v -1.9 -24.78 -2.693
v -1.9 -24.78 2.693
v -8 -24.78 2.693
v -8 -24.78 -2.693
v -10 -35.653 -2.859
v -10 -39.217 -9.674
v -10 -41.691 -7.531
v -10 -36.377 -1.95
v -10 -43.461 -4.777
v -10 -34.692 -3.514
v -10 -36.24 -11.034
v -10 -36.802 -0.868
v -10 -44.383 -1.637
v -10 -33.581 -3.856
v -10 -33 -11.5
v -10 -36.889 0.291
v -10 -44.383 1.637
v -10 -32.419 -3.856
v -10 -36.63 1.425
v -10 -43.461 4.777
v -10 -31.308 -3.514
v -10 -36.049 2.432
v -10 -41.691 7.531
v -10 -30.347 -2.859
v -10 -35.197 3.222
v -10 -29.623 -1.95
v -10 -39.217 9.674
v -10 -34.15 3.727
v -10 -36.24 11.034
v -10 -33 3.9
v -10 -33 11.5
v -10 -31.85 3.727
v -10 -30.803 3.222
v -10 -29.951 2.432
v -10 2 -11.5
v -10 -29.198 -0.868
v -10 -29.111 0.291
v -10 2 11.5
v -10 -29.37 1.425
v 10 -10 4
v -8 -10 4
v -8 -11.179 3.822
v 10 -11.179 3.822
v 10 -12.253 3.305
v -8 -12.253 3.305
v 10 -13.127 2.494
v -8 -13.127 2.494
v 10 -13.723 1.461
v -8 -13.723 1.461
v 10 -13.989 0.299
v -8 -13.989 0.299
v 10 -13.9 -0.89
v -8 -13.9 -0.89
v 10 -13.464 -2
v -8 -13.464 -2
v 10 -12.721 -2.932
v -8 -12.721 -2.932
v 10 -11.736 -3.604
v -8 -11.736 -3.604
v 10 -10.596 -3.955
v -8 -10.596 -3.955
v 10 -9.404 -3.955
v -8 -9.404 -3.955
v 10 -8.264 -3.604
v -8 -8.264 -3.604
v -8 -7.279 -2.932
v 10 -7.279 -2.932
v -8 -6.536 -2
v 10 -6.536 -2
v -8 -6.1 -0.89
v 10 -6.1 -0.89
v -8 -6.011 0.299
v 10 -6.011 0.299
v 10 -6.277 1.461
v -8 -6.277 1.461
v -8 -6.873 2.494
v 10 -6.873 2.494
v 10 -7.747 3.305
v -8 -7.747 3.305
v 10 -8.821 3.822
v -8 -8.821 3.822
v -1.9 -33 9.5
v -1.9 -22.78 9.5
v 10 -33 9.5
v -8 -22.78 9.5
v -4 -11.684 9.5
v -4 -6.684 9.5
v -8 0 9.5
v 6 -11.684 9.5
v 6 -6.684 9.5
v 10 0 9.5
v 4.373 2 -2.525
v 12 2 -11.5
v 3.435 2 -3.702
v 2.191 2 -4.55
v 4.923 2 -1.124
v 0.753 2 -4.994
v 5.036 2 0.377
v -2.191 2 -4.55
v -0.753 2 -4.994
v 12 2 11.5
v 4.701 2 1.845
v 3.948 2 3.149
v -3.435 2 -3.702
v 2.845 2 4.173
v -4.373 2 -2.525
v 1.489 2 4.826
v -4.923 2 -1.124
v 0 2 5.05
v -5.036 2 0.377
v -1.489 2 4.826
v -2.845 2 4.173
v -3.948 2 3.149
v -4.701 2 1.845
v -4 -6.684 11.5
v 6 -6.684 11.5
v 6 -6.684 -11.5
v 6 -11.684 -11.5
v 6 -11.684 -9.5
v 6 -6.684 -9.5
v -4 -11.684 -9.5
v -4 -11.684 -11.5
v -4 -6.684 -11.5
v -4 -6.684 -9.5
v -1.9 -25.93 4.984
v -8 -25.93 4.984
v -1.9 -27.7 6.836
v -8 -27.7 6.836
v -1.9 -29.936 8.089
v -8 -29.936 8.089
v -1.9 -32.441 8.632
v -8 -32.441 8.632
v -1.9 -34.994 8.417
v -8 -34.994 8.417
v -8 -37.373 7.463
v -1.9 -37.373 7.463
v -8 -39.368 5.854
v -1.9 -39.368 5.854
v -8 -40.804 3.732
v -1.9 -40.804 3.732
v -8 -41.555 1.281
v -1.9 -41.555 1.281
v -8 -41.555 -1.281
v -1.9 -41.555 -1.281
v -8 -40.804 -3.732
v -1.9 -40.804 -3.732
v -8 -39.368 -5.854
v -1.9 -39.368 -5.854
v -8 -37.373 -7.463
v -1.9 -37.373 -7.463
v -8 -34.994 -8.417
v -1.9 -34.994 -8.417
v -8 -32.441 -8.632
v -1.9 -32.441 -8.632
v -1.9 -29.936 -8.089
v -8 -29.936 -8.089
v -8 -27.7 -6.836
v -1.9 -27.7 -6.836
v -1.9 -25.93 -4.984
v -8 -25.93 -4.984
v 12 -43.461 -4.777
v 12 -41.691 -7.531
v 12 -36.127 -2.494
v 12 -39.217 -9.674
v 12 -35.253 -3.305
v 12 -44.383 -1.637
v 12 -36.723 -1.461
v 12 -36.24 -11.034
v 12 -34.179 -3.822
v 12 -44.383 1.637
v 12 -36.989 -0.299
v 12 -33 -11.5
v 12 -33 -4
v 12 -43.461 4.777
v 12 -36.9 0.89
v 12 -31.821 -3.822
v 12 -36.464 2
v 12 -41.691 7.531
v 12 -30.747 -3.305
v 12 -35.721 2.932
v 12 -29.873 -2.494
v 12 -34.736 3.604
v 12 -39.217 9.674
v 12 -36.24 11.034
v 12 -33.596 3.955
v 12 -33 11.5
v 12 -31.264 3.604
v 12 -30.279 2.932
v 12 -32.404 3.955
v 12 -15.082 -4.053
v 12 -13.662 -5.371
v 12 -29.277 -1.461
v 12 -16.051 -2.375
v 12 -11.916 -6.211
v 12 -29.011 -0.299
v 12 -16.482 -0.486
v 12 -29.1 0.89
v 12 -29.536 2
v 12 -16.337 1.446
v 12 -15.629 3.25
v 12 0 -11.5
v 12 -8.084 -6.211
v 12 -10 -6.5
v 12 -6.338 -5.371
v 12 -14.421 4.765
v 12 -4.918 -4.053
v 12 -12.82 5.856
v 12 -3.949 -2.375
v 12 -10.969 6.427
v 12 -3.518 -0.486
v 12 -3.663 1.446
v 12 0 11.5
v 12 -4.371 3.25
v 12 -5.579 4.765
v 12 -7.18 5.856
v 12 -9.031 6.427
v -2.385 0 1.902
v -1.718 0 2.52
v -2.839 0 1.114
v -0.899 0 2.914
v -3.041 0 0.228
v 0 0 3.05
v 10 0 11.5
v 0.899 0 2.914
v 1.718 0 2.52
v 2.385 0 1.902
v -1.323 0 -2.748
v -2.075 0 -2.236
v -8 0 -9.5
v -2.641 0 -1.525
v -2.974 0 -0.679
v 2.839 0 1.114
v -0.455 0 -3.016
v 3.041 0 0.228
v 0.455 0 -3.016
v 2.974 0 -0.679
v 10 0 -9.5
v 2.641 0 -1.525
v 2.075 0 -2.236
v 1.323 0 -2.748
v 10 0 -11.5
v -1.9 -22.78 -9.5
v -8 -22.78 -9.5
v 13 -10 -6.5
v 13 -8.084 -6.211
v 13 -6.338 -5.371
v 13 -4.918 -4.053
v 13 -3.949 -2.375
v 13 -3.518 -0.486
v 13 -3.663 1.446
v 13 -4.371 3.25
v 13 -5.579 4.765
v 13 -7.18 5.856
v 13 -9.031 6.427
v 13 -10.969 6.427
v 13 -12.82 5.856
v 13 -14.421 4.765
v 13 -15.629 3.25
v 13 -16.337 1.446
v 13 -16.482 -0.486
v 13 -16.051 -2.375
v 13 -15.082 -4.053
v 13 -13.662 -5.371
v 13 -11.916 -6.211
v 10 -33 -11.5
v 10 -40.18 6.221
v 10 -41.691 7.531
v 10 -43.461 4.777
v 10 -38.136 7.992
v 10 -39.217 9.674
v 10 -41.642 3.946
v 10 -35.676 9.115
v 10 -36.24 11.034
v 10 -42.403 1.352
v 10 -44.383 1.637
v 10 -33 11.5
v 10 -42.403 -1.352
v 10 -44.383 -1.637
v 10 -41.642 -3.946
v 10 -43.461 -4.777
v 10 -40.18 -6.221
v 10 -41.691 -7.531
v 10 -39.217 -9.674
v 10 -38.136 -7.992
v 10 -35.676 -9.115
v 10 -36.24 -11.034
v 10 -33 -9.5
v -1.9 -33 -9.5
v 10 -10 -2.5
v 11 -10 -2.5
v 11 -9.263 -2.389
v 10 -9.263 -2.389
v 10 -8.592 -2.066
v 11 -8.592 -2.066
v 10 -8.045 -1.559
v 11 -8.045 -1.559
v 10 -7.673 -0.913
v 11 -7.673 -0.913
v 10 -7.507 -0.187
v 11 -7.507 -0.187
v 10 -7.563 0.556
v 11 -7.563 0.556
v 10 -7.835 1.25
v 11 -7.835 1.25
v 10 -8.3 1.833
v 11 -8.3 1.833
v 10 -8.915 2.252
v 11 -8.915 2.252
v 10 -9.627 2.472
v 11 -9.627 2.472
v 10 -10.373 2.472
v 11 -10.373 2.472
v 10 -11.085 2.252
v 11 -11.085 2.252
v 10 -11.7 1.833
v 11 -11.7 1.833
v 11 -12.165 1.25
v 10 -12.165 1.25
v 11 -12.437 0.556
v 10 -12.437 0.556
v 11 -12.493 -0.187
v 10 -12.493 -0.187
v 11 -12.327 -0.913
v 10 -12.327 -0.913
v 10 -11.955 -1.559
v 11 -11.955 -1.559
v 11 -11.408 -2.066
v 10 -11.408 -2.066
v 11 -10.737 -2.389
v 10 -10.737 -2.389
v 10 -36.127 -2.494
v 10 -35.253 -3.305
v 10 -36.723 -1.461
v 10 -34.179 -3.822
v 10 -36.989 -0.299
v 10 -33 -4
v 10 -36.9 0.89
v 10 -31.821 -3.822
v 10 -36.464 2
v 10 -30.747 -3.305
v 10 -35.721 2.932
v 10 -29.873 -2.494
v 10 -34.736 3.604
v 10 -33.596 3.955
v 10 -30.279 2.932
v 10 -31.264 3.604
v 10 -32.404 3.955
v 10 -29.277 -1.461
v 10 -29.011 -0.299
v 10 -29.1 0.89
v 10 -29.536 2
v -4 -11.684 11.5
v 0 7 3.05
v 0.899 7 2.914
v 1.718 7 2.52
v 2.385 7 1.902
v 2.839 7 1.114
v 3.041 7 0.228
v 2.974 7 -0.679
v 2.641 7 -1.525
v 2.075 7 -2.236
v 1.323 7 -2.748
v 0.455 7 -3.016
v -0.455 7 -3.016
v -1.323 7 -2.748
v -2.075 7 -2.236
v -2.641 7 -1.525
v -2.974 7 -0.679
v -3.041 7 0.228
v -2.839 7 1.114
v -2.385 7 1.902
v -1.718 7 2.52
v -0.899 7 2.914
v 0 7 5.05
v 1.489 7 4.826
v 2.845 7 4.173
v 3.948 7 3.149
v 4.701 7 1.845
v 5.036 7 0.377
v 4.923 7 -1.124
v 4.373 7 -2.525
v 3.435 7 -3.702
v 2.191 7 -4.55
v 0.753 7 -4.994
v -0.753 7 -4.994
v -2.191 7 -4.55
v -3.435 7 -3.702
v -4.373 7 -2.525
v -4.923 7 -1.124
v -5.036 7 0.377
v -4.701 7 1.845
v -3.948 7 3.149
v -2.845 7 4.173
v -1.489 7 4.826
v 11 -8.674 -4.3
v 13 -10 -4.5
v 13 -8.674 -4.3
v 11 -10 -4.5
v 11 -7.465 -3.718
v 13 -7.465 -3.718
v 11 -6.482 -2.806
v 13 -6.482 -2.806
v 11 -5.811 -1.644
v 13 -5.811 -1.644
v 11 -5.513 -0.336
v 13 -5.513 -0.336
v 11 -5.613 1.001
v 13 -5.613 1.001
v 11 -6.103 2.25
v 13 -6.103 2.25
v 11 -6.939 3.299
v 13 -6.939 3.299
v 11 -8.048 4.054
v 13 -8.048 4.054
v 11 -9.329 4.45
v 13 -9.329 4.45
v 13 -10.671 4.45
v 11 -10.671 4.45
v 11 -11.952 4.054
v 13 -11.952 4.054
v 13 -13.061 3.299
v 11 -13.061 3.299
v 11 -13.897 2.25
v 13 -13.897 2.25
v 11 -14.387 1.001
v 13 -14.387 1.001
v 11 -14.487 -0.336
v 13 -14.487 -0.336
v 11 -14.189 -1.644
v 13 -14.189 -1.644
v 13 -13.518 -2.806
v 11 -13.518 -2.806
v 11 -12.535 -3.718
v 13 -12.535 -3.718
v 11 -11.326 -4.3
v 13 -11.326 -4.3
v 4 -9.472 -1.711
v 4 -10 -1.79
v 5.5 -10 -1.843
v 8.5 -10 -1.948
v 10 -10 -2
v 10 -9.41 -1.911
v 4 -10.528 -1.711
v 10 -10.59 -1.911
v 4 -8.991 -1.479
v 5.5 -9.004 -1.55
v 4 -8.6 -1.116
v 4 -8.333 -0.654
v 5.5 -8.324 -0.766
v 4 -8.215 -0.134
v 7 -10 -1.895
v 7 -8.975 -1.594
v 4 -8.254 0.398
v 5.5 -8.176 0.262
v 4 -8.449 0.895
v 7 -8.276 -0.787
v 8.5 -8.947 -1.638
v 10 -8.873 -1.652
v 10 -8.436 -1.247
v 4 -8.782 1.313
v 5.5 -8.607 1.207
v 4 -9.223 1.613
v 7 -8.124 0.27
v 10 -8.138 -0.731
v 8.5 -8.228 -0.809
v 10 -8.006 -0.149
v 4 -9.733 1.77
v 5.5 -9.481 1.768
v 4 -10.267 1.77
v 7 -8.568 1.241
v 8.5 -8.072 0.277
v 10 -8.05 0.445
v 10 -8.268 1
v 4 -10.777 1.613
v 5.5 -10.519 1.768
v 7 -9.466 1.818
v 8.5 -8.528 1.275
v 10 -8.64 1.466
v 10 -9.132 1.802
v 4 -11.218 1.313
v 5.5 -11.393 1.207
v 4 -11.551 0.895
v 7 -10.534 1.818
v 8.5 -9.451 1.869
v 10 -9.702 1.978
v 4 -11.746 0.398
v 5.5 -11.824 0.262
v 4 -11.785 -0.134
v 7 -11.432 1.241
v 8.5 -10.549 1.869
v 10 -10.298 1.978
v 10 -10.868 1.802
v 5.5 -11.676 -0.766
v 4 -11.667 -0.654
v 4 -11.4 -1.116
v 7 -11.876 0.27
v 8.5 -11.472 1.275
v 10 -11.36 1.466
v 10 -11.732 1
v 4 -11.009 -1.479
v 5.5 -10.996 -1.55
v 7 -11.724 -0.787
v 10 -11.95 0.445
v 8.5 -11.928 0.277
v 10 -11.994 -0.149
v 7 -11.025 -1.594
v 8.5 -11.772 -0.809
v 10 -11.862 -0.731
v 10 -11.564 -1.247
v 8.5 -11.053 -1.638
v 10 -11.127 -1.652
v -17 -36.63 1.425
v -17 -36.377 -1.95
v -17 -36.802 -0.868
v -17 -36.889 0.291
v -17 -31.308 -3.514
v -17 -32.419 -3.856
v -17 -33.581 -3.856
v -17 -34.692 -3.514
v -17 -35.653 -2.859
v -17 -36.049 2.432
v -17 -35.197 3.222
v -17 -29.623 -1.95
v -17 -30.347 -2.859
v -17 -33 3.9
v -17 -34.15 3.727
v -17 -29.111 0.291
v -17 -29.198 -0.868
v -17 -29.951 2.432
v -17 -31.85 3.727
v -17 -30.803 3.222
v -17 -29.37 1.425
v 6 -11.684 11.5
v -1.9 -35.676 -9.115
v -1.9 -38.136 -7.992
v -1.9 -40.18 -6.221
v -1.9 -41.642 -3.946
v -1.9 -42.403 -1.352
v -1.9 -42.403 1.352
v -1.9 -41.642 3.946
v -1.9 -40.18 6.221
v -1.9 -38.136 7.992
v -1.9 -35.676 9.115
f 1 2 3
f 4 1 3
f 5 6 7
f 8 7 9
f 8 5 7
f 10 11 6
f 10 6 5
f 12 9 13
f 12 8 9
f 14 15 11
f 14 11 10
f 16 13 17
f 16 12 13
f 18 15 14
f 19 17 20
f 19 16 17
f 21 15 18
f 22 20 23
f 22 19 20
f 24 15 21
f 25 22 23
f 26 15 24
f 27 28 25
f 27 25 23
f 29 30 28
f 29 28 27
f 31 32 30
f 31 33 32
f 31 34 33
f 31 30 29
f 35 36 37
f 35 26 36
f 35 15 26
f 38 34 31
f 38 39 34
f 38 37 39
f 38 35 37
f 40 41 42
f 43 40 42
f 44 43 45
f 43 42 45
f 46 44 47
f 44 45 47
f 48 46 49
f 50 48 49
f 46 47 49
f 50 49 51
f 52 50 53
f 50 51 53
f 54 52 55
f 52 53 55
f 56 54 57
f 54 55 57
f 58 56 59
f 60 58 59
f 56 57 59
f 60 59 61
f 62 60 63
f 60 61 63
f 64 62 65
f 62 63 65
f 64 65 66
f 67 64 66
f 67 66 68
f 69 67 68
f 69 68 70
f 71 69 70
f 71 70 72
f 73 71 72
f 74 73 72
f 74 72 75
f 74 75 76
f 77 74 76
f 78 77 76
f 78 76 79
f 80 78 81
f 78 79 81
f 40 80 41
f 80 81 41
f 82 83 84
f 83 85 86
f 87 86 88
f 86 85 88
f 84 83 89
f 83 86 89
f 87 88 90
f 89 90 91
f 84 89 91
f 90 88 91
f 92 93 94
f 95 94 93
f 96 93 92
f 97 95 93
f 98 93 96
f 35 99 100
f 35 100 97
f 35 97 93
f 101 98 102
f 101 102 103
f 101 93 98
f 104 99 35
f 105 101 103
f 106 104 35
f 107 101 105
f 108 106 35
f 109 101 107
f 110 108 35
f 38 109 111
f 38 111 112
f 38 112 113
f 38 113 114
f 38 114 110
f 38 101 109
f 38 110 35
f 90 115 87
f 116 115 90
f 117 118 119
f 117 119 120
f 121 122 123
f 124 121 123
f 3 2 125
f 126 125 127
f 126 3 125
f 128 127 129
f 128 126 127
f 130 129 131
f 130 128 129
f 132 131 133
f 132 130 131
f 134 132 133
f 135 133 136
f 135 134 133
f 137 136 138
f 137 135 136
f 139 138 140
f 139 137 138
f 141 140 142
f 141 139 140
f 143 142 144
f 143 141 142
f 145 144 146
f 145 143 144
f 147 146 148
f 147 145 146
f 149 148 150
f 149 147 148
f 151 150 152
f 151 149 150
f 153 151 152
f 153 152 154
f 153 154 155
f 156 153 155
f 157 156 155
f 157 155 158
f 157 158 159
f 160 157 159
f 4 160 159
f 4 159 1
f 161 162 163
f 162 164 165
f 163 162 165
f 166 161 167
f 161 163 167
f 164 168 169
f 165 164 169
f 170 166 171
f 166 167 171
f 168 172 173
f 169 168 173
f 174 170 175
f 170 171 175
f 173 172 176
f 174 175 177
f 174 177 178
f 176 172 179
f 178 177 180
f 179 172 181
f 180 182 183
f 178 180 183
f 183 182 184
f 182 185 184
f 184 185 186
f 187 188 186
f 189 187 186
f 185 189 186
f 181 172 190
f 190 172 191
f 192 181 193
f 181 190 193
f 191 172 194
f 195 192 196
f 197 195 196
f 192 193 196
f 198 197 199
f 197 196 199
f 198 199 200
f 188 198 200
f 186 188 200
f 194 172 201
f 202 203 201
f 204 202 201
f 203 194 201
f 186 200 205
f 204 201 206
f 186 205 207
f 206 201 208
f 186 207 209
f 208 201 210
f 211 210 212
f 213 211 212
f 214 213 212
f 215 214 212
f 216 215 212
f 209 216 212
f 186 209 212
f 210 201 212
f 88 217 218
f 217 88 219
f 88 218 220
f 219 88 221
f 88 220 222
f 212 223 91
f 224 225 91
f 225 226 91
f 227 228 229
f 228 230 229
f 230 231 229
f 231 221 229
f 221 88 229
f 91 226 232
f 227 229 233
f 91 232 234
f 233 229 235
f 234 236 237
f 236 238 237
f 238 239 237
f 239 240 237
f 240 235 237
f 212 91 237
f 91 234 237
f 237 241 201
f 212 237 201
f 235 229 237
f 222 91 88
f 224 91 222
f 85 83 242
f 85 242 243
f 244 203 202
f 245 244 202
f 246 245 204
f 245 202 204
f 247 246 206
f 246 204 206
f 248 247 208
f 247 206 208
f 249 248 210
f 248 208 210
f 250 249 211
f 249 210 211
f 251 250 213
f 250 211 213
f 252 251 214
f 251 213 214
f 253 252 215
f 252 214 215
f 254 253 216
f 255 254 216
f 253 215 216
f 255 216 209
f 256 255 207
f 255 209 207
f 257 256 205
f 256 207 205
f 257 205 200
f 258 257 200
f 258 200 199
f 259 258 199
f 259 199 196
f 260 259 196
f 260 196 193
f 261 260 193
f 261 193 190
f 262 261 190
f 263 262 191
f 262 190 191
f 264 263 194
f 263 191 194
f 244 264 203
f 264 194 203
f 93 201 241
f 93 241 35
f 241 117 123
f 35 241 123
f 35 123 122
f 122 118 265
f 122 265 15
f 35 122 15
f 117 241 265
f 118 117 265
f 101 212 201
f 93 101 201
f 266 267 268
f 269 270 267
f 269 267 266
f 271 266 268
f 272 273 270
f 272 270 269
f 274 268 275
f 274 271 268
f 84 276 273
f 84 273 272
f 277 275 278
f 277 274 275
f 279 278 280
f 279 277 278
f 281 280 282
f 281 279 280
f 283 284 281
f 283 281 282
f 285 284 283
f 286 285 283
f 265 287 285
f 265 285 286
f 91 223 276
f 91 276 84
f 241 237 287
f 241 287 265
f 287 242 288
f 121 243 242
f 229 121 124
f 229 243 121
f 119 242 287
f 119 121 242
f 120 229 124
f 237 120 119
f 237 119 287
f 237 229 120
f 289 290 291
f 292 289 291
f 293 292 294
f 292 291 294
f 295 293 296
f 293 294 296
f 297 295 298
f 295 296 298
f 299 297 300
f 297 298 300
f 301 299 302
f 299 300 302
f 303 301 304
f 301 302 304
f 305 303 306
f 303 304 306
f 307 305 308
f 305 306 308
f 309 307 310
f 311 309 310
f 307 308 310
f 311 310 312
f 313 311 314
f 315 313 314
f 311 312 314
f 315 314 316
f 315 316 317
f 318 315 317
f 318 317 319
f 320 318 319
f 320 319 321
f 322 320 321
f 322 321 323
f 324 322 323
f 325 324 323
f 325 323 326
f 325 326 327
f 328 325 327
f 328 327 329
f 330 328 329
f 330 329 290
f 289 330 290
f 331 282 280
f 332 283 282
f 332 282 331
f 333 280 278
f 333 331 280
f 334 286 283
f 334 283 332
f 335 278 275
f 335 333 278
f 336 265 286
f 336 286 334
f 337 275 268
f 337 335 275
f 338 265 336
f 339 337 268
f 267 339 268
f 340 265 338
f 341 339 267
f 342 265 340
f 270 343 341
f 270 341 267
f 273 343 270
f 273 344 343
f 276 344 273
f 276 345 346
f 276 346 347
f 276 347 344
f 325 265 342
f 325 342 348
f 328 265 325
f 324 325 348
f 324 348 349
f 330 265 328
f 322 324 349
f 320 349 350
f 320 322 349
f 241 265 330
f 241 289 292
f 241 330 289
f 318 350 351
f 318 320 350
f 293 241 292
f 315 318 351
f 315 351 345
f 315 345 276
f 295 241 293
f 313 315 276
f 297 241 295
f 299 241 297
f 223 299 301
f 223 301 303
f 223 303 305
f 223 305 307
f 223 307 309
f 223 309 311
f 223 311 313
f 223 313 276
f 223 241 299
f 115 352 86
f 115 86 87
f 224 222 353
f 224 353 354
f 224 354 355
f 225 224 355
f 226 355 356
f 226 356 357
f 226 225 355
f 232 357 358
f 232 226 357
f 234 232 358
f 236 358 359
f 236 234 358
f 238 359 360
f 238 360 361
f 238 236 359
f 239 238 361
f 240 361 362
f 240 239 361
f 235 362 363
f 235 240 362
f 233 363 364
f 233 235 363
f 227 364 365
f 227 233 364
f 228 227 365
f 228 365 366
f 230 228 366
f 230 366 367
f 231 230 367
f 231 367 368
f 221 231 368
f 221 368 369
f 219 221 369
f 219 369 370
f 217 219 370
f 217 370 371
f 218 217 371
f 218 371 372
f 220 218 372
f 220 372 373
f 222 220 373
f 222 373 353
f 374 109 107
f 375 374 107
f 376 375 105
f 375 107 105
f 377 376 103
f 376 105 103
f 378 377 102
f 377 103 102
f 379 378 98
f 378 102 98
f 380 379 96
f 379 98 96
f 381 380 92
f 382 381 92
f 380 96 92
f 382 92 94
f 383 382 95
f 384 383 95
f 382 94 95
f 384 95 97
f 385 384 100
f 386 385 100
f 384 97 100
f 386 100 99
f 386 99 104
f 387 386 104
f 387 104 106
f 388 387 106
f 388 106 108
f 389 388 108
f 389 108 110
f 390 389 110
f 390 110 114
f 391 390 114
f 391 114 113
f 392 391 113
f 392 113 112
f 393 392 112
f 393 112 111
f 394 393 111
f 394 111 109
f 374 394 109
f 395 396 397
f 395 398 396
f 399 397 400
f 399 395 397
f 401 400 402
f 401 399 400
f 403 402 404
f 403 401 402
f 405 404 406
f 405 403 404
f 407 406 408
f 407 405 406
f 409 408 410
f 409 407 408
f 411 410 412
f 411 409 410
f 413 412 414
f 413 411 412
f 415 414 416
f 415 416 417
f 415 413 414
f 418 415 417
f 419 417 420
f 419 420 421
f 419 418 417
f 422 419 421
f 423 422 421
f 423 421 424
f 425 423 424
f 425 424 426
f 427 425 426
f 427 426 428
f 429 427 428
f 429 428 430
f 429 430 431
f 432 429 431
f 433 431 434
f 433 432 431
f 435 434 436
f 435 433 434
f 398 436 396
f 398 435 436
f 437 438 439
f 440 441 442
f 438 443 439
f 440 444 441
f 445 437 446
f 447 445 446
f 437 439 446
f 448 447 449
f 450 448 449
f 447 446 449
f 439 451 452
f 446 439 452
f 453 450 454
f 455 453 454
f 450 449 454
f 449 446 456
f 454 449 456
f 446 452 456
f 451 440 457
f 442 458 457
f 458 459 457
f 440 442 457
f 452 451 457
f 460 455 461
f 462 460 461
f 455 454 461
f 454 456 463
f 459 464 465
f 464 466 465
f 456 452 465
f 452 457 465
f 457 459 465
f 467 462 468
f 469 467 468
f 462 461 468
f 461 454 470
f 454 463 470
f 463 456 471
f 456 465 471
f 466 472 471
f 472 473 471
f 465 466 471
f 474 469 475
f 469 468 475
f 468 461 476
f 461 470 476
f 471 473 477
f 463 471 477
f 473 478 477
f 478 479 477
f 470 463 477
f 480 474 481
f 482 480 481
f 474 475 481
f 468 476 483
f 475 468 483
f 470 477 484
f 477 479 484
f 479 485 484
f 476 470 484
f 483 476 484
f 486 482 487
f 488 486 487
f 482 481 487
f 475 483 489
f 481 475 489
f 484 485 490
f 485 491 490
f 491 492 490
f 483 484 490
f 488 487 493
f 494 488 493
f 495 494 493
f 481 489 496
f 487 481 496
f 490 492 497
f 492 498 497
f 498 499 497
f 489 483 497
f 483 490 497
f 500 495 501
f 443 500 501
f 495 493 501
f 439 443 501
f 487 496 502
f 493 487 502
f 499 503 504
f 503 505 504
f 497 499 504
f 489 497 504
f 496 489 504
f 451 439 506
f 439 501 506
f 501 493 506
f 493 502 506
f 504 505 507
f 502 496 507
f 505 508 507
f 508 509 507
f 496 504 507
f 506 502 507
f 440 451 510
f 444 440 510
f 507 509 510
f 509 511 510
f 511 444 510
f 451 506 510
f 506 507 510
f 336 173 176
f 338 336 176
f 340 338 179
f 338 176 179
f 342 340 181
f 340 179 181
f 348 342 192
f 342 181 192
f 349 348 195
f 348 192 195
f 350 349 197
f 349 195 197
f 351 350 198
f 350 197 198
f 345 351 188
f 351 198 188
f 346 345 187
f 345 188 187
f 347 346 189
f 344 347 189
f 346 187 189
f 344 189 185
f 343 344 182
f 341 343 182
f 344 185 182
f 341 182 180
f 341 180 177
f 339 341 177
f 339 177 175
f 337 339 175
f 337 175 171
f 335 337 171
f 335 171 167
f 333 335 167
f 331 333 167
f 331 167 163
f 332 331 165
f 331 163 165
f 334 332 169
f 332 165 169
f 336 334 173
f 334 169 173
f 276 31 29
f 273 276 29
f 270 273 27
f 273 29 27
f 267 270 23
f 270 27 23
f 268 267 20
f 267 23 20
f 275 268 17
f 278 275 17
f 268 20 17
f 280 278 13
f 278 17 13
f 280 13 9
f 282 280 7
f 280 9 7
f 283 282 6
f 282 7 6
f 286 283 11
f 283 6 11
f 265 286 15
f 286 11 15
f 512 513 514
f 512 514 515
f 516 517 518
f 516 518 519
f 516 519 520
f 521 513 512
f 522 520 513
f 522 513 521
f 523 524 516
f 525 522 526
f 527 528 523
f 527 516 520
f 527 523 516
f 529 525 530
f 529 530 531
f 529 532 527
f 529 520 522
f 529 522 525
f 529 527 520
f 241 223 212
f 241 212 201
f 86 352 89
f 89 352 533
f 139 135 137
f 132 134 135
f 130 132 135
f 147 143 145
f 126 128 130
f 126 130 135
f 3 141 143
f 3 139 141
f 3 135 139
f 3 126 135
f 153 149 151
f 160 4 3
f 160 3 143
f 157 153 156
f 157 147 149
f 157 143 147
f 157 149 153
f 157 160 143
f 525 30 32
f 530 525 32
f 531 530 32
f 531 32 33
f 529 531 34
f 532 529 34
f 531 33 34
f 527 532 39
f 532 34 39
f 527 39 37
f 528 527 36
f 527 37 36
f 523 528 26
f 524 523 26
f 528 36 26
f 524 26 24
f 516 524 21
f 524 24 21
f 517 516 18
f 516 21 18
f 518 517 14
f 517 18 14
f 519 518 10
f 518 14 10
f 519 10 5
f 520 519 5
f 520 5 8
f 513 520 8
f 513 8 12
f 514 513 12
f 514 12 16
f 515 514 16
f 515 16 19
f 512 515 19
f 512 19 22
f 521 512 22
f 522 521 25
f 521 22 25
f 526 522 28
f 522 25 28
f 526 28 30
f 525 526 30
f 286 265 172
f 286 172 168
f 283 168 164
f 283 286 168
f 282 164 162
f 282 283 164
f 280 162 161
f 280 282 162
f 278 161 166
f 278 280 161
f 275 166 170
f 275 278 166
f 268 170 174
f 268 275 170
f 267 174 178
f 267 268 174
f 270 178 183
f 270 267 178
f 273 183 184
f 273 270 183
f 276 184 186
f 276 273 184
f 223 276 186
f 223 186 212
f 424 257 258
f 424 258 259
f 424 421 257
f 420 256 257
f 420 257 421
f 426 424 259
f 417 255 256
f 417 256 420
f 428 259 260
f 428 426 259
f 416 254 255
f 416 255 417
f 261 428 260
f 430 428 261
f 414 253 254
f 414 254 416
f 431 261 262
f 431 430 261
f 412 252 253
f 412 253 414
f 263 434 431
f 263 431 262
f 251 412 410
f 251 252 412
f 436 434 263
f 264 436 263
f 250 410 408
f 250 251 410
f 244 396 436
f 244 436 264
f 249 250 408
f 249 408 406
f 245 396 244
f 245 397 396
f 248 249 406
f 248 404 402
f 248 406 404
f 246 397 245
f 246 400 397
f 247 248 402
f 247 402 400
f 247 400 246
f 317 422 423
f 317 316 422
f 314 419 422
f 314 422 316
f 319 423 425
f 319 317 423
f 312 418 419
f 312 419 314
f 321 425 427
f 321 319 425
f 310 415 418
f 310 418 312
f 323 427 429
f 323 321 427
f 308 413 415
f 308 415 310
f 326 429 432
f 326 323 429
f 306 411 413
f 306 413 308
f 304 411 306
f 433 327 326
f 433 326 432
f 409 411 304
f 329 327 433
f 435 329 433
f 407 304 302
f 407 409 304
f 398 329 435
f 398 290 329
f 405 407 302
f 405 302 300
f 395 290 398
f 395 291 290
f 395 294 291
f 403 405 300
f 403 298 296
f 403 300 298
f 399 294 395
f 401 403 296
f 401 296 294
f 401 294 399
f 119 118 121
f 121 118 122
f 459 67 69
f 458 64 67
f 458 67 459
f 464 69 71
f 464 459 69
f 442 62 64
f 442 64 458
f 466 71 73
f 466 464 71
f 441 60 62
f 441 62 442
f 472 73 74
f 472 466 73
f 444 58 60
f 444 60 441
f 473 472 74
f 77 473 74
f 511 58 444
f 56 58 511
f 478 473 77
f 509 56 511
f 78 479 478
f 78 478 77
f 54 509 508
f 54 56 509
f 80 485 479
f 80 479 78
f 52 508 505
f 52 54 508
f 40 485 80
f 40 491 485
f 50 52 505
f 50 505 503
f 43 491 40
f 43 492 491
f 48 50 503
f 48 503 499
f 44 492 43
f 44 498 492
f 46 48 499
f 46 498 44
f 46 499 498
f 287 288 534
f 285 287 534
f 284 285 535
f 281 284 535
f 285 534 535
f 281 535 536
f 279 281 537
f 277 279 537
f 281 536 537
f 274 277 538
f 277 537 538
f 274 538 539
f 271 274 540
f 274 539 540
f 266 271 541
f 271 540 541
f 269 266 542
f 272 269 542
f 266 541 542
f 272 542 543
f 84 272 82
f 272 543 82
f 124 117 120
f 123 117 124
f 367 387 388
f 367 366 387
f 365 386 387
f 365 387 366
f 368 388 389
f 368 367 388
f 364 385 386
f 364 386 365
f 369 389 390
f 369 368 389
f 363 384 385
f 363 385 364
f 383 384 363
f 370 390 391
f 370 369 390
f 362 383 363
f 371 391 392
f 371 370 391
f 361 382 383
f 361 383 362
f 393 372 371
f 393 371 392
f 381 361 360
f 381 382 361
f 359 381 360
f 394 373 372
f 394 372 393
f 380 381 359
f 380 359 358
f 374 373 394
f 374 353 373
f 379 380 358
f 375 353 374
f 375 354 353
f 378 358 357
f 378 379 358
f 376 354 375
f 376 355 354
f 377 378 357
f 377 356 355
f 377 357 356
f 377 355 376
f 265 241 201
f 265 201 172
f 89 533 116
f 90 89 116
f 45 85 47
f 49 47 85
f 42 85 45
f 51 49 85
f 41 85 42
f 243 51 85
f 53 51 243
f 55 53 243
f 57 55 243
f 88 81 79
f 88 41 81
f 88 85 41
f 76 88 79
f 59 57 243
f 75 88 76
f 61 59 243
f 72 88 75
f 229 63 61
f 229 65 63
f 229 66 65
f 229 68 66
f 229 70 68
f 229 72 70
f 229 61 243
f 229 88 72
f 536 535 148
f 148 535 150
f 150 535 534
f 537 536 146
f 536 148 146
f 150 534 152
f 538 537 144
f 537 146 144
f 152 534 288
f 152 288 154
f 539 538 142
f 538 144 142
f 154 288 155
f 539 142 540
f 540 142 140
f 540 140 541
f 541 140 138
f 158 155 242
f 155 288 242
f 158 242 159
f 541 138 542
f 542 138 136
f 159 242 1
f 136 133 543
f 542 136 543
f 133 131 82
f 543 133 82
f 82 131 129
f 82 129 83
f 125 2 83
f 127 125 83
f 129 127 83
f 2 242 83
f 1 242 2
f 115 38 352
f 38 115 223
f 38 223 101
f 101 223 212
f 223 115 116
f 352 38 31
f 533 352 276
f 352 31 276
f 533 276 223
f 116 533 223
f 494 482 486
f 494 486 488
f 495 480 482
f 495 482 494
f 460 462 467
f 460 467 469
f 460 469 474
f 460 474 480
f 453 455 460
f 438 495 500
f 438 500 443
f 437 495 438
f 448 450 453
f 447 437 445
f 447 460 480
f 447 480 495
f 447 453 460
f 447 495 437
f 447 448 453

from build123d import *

# Parameters (mm, degrees)
SKETCH1_R            = 5.05
SKETCH1_R_2          = 3.05
BOSS_EXTRUDE1_DEPTH  = 7
SKETCH2_R            = 3.05
BOSS_EXTRUDE2_DEPTH  = 2
SKETCH3_W            = 20
SKETCH3_H            = 2
BOSS_EXTRUDE3_DEPTH  = 35
BOSS_EXTRUDE4_DEPTH  = 20
SKETCH5_W            = 8.1
SKETCH5_H            = 2
BOSS_EXTRUDE5_DEPTH  = 19
BOSS_EXTRUDE6_DEPTH  = 8.1
BOSS_EXTRUDE7_DEPTH  = 2
SKETCH8_R            = 3.9
BOSS_EXTRUDE8_DEPTH  = 7
SKETCH9_R            = 4
BOSS_EXTRUDE9_DEPTH  = 18
SKETCH10_R           = 2
CUT_EXTRUDE1_DEPTH   = 6
CUT_EXTRUDE1_DRAFT   = -2
BOSS_EXTRUDE10_DEPTH = 2
CUT_EXTRUDE2_DEPTH   = 2
BOSS_EXTRUDE11_START = -2
SKETCH13_W           = 22
SKETCH13_H           = 23
SKETCH13_R           = 5.05
BOSS_EXTRUDE11_DEPTH = 2
SKETCH14_R           = 2.5
CUT_EXTRUDE3_DEPTH   = 2
SKETCH15_R           = 4.5
SKETCH15_R_2         = 2.5
CUT_EXTRUDE4_DEPTH   = 1
SKETCH16_R           = 6.5
SKETCH16_R_2         = 4.5
BOSS_EXTRUDE12_DEPTH = 1
SKETCH18_R           = 4
CUT_EXTRUDE6_DEPTH   = 2
SKETCH19_W           = 10
SKETCH19_H           = 5
CUT_EXTRUDE7_DEPTH   = 2
SKETCH20_W           = 10
SKETCH20_H           = 5
CUT_EXTRUDE8_DEPTH   = 2
SKETCH21_R           = 2
BOSS_EXTRUDE13_DEPTH = 2


with BuildPart() as part:
    # Sketch1 → Boss-Extrude1 (new body)
    with BuildSketch(Plane(origin=(0, 0, 0), x_dir=(1, 0, 0), z_dir=(0, 1, 0))):
        with Locations(Location((0, 0, 0), (0, 0, 270))):
            Circle(SKETCH1_R)
        with Locations(Location((0, 0, 0), (0, 0, 270))):
            Circle(SKETCH1_R_2, mode=Mode.SUBTRACT)
    extrude(amount=BOSS_EXTRUDE1_DEPTH)

    # Sketch2 → Boss-Extrude2 (add)
    with BuildSketch(Plane.XZ):
        with BuildLine():
            Line((-10, 11.5), (10, 11.5))
            ThreePointArc((10, 11.5), (21.5, 0), (10, -11.5))
            Line((10, -11.5), (-10, -11.5))
            ThreePointArc((-10, -11.5), (-21.5, 0), (-10, 11.5))
        make_face()
        with Locations(Location((0, 0, 0), (0, 0, 90))):
            Circle(SKETCH2_R, mode=Mode.SUBTRACT)
    extrude(amount=-BOSS_EXTRUDE2_DEPTH)

    # Sketch3 → Boss-Extrude3 (add)
    with BuildSketch(Plane(origin=(0, 2, 0), x_dir=(1, 0, 0), z_dir=(0, 1, 0))):
        with Locations((0, 10.5)):
            Rectangle(SKETCH3_W, SKETCH3_H)
        with Locations((0, -10.5)):
            Rectangle(SKETCH3_W, SKETCH3_H)
    extrude(amount=-BOSS_EXTRUDE3_DEPTH)

    # Sketch4 → Boss-Extrude4 (add)
    with BuildSketch(Plane.ZY.offset(10)):
        with BuildLine():
            Line((-11.5, -33), (-9.5, -33))
            ThreePointArc((-9.5, -33), (0, -42.5), (9.5, -33))
            Line((9.5, -33), (11.5, -33))
            ThreePointArc((11.5, -33), (0, -44.5), (-11.5, -33))
        make_face()
    extrude(amount=-BOSS_EXTRUDE4_DEPTH)

    # Sketch5 → Boss-Extrude5 (add)
    with BuildSketch(Plane(origin=(0, 0, 9.5), x_dir=(-1, 0, 0), z_dir=(0, 0, -1))):
        with Locations((5.95, -23.78)):
            Rectangle(SKETCH5_W, SKETCH5_H)
    extrude(amount=BOSS_EXTRUDE5_DEPTH)

    # Sketch6 → Boss-Extrude6 (add)
    with BuildSketch(Plane.ZY.offset(10)):
        with BuildLine():
            Line((9.5, -24.78), (2.693343647, -24.78))
            ThreePointArc((2.693343647, -24.78), (0, -41.65), (-2.693343647, -24.78))
            Line((-2.693343647, -24.78), (-9.5, -24.78))
            Line((-9.5, -24.78), (-9.5, -33))
            ThreePointArc((-9.5, -33), (0, -42.5), (9.5, -33))
            Line((9.5, -33), (9.5, -24.78))
        make_face()
    extrude(amount=-BOSS_EXTRUDE6_DEPTH)

    # Sketch7 → Boss-Extrude7 (add)
    with BuildSketch(Plane.ZY.offset(10)):
        with BuildLine():
            Line((-11.5, 2), (11.5, 2))
            Line((11.5, 2), (11.5, -33))
            ThreePointArc((11.5, -33), (0, -44.5), (-11.5, -33))
            Line((-11.5, -33), (-11.5, 2))
        make_face()
    extrude(amount=-BOSS_EXTRUDE7_DEPTH)

    # Sketch8 → Boss-Extrude8 (add)
    with BuildSketch(Plane.ZY.offset(10)):
        with Locations((0, -33)):
            Circle(SKETCH8_R)
    extrude(amount=BOSS_EXTRUDE8_DEPTH)

    # Sketch9 → Boss-Extrude9 (add)
    with BuildSketch(Plane(origin=(-8, 0, 0), x_dir=(0, 0, -1), z_dir=(1, 0, 0))):
        with Locations(Location((0, -10, 0), (0, 0, 180))):
            Circle(SKETCH9_R)
    extrude(amount=BOSS_EXTRUDE9_DEPTH)


with BuildPart() as cut_extrude1_tool:
    # Sketch10 → Cut-Extrude1 (with draft: the straight prism first)
    with BuildSketch(Plane(origin=(10, 0, 0), x_dir=(0, 0, -1), z_dir=(1, 0, 0))):
        with Locations((0, -10)):
            Circle(SKETCH10_R)
    extrude(amount=-CUT_EXTRUDE1_DEPTH)
    # Cut-Extrude1: the draft: its side faces are tilted about the plane it starts from
    cut_extrude1_sides = [cut_extrude1_tool.faces().sort_by_distance(p)[0] for p in [
        (7, -10, 2),
    ]]
    draft(cut_extrude1_sides, Plane(origin=(10, 0, 0), x_dir=(0, 0, -1), z_dir=(1, 0, 0)), CUT_EXTRUDE1_DRAFT)


with BuildPart() as part_1:
    add(part.part)

    # Cut-Extrude1: cut by cut_extrude1_tool
    add(cut_extrude1_tool.part, mode=Mode.SUBTRACT)

    # Sketch12 → Cut-Extrude2 (cut)
    with BuildSketch(Plane.XZ):
        with BuildLine():
            Line((-10, 11.5), (-10, -11.5))
            ThreePointArc((-10, -11.5), (-21.5, 0), (-10, 11.5))
        make_face()
        with BuildLine():
            Line((12, 11.324751653), (12, -11.324751653))
            ThreePointArc((12, -11.324751653), (21.5, 0), (12, 11.324751653))
        make_face()
    extrude(amount=-CUT_EXTRUDE2_DEPTH, mode=Mode.SUBTRACT)

    # Sketch13 → Boss-Extrude11 (add)
    with BuildSketch(Plane(origin=(0, 2, 0), x_dir=(1, 0, 0), z_dir=(0, 1, 0)).offset(BOSS_EXTRUDE11_START)):
        with Locations((1, 0)):
            Rectangle(SKETCH13_W, SKETCH13_H)
        with Locations(Location((0, 0, 0), (0, 0, 90))):
            Circle(SKETCH13_R, mode=Mode.SUBTRACT)
    extrude(amount=BOSS_EXTRUDE11_DEPTH)

    # Sketch19 → Cut-Extrude7 (cut)
    with BuildSketch(Plane(origin=(0, 0, -11.5), x_dir=(-1, 0, 0), z_dir=(0, 0, -1))):
        with Locations((-1, -9.184069539)):
            Rectangle(SKETCH19_W, SKETCH19_H)
    extrude(amount=-CUT_EXTRUDE7_DEPTH, mode=Mode.SUBTRACT)

    # Sketch20 → Cut-Extrude8 (cut)
    with BuildSketch(Plane.XY.offset(11.5)):
        with Locations((1, -9.184069539)):
            Rectangle(SKETCH20_W, SKETCH20_H)
    extrude(amount=-CUT_EXTRUDE8_DEPTH, mode=Mode.SUBTRACT)


with BuildPart() as body_2:
    # Sketch11 → Boss-Extrude10 (new body)
    with BuildSketch(Plane(origin=(10, 0, 0), x_dir=(0, 0, -1), z_dir=(1, 0, 0))):
        with BuildLine():
            Line((-11.5, 0), (11.5, 0))
            Line((11.5, 0), (11.5, -33))
            ThreePointArc((11.5, -33), (0, -44.5), (-11.5, -33))
            Line((-11.5, -33), (-11.5, 0))
        make_face()
    extrude(amount=BOSS_EXTRUDE10_DEPTH)

    # Sketch14 → Cut-Extrude3 (cut)
    with BuildSketch(Plane(origin=(12, 0, 0), x_dir=(0, 0, -1), z_dir=(1, 0, 0))):
        with Locations((0, -10)):
            Circle(SKETCH14_R)
    extrude(amount=-CUT_EXTRUDE3_DEPTH, mode=Mode.SUBTRACT)

    # Sketch15 → Cut-Extrude4 (cut)
    with BuildSketch(Plane(origin=(12, 0, 0), x_dir=(0, 0, -1), z_dir=(1, 0, 0))):
        with Locations((0, -10)):
            Circle(SKETCH15_R)
        with Locations((0, -10)):
            Circle(SKETCH15_R_2, mode=Mode.SUBTRACT)
    extrude(amount=-CUT_EXTRUDE4_DEPTH, mode=Mode.SUBTRACT)

    # Sketch16 → Boss-Extrude12 (add)
    with BuildSketch(Plane(origin=(12, 0, 0), x_dir=(0, 0, -1), z_dir=(1, 0, 0))):
        with Locations((0, -10)):
            Circle(SKETCH16_R)
        with Locations((0, -10)):
            Circle(SKETCH16_R_2, mode=Mode.SUBTRACT)
    extrude(amount=BOSS_EXTRUDE12_DEPTH)

    # Sketch18 → Cut-Extrude6 (cut)
    with BuildSketch(Plane(origin=(12, 0, 0), x_dir=(0, 0, -1), z_dir=(1, 0, 0))):
        with Locations((0, -33)):
            Circle(SKETCH18_R)
    extrude(amount=-CUT_EXTRUDE6_DEPTH, mode=Mode.SUBTRACT)


with BuildPart() as body_3:
    # Sketch21 → Boss-Extrude13 (new body)
    with BuildSketch(Plane(origin=(10, 0, 0), x_dir=(0, 0, -1), z_dir=(1, 0, 0))):
        with BuildLine():
            Line((-11.5, 0), (11.5, 0))
            Line((11.5, 0), (11.5, -33))
            ThreePointArc((11.5, -33), (0, -44.5), (-11.5, -33))
            Line((-11.5, -33), (-11.5, 0))
        make_face()
        with Locations((0, -10)):
            Circle(SKETCH21_R, mode=Mode.SUBTRACT)
    extrude(amount=BOSS_EXTRUDE13_DEPTH)


solid = Compound([part_1.part, body_2.part])
